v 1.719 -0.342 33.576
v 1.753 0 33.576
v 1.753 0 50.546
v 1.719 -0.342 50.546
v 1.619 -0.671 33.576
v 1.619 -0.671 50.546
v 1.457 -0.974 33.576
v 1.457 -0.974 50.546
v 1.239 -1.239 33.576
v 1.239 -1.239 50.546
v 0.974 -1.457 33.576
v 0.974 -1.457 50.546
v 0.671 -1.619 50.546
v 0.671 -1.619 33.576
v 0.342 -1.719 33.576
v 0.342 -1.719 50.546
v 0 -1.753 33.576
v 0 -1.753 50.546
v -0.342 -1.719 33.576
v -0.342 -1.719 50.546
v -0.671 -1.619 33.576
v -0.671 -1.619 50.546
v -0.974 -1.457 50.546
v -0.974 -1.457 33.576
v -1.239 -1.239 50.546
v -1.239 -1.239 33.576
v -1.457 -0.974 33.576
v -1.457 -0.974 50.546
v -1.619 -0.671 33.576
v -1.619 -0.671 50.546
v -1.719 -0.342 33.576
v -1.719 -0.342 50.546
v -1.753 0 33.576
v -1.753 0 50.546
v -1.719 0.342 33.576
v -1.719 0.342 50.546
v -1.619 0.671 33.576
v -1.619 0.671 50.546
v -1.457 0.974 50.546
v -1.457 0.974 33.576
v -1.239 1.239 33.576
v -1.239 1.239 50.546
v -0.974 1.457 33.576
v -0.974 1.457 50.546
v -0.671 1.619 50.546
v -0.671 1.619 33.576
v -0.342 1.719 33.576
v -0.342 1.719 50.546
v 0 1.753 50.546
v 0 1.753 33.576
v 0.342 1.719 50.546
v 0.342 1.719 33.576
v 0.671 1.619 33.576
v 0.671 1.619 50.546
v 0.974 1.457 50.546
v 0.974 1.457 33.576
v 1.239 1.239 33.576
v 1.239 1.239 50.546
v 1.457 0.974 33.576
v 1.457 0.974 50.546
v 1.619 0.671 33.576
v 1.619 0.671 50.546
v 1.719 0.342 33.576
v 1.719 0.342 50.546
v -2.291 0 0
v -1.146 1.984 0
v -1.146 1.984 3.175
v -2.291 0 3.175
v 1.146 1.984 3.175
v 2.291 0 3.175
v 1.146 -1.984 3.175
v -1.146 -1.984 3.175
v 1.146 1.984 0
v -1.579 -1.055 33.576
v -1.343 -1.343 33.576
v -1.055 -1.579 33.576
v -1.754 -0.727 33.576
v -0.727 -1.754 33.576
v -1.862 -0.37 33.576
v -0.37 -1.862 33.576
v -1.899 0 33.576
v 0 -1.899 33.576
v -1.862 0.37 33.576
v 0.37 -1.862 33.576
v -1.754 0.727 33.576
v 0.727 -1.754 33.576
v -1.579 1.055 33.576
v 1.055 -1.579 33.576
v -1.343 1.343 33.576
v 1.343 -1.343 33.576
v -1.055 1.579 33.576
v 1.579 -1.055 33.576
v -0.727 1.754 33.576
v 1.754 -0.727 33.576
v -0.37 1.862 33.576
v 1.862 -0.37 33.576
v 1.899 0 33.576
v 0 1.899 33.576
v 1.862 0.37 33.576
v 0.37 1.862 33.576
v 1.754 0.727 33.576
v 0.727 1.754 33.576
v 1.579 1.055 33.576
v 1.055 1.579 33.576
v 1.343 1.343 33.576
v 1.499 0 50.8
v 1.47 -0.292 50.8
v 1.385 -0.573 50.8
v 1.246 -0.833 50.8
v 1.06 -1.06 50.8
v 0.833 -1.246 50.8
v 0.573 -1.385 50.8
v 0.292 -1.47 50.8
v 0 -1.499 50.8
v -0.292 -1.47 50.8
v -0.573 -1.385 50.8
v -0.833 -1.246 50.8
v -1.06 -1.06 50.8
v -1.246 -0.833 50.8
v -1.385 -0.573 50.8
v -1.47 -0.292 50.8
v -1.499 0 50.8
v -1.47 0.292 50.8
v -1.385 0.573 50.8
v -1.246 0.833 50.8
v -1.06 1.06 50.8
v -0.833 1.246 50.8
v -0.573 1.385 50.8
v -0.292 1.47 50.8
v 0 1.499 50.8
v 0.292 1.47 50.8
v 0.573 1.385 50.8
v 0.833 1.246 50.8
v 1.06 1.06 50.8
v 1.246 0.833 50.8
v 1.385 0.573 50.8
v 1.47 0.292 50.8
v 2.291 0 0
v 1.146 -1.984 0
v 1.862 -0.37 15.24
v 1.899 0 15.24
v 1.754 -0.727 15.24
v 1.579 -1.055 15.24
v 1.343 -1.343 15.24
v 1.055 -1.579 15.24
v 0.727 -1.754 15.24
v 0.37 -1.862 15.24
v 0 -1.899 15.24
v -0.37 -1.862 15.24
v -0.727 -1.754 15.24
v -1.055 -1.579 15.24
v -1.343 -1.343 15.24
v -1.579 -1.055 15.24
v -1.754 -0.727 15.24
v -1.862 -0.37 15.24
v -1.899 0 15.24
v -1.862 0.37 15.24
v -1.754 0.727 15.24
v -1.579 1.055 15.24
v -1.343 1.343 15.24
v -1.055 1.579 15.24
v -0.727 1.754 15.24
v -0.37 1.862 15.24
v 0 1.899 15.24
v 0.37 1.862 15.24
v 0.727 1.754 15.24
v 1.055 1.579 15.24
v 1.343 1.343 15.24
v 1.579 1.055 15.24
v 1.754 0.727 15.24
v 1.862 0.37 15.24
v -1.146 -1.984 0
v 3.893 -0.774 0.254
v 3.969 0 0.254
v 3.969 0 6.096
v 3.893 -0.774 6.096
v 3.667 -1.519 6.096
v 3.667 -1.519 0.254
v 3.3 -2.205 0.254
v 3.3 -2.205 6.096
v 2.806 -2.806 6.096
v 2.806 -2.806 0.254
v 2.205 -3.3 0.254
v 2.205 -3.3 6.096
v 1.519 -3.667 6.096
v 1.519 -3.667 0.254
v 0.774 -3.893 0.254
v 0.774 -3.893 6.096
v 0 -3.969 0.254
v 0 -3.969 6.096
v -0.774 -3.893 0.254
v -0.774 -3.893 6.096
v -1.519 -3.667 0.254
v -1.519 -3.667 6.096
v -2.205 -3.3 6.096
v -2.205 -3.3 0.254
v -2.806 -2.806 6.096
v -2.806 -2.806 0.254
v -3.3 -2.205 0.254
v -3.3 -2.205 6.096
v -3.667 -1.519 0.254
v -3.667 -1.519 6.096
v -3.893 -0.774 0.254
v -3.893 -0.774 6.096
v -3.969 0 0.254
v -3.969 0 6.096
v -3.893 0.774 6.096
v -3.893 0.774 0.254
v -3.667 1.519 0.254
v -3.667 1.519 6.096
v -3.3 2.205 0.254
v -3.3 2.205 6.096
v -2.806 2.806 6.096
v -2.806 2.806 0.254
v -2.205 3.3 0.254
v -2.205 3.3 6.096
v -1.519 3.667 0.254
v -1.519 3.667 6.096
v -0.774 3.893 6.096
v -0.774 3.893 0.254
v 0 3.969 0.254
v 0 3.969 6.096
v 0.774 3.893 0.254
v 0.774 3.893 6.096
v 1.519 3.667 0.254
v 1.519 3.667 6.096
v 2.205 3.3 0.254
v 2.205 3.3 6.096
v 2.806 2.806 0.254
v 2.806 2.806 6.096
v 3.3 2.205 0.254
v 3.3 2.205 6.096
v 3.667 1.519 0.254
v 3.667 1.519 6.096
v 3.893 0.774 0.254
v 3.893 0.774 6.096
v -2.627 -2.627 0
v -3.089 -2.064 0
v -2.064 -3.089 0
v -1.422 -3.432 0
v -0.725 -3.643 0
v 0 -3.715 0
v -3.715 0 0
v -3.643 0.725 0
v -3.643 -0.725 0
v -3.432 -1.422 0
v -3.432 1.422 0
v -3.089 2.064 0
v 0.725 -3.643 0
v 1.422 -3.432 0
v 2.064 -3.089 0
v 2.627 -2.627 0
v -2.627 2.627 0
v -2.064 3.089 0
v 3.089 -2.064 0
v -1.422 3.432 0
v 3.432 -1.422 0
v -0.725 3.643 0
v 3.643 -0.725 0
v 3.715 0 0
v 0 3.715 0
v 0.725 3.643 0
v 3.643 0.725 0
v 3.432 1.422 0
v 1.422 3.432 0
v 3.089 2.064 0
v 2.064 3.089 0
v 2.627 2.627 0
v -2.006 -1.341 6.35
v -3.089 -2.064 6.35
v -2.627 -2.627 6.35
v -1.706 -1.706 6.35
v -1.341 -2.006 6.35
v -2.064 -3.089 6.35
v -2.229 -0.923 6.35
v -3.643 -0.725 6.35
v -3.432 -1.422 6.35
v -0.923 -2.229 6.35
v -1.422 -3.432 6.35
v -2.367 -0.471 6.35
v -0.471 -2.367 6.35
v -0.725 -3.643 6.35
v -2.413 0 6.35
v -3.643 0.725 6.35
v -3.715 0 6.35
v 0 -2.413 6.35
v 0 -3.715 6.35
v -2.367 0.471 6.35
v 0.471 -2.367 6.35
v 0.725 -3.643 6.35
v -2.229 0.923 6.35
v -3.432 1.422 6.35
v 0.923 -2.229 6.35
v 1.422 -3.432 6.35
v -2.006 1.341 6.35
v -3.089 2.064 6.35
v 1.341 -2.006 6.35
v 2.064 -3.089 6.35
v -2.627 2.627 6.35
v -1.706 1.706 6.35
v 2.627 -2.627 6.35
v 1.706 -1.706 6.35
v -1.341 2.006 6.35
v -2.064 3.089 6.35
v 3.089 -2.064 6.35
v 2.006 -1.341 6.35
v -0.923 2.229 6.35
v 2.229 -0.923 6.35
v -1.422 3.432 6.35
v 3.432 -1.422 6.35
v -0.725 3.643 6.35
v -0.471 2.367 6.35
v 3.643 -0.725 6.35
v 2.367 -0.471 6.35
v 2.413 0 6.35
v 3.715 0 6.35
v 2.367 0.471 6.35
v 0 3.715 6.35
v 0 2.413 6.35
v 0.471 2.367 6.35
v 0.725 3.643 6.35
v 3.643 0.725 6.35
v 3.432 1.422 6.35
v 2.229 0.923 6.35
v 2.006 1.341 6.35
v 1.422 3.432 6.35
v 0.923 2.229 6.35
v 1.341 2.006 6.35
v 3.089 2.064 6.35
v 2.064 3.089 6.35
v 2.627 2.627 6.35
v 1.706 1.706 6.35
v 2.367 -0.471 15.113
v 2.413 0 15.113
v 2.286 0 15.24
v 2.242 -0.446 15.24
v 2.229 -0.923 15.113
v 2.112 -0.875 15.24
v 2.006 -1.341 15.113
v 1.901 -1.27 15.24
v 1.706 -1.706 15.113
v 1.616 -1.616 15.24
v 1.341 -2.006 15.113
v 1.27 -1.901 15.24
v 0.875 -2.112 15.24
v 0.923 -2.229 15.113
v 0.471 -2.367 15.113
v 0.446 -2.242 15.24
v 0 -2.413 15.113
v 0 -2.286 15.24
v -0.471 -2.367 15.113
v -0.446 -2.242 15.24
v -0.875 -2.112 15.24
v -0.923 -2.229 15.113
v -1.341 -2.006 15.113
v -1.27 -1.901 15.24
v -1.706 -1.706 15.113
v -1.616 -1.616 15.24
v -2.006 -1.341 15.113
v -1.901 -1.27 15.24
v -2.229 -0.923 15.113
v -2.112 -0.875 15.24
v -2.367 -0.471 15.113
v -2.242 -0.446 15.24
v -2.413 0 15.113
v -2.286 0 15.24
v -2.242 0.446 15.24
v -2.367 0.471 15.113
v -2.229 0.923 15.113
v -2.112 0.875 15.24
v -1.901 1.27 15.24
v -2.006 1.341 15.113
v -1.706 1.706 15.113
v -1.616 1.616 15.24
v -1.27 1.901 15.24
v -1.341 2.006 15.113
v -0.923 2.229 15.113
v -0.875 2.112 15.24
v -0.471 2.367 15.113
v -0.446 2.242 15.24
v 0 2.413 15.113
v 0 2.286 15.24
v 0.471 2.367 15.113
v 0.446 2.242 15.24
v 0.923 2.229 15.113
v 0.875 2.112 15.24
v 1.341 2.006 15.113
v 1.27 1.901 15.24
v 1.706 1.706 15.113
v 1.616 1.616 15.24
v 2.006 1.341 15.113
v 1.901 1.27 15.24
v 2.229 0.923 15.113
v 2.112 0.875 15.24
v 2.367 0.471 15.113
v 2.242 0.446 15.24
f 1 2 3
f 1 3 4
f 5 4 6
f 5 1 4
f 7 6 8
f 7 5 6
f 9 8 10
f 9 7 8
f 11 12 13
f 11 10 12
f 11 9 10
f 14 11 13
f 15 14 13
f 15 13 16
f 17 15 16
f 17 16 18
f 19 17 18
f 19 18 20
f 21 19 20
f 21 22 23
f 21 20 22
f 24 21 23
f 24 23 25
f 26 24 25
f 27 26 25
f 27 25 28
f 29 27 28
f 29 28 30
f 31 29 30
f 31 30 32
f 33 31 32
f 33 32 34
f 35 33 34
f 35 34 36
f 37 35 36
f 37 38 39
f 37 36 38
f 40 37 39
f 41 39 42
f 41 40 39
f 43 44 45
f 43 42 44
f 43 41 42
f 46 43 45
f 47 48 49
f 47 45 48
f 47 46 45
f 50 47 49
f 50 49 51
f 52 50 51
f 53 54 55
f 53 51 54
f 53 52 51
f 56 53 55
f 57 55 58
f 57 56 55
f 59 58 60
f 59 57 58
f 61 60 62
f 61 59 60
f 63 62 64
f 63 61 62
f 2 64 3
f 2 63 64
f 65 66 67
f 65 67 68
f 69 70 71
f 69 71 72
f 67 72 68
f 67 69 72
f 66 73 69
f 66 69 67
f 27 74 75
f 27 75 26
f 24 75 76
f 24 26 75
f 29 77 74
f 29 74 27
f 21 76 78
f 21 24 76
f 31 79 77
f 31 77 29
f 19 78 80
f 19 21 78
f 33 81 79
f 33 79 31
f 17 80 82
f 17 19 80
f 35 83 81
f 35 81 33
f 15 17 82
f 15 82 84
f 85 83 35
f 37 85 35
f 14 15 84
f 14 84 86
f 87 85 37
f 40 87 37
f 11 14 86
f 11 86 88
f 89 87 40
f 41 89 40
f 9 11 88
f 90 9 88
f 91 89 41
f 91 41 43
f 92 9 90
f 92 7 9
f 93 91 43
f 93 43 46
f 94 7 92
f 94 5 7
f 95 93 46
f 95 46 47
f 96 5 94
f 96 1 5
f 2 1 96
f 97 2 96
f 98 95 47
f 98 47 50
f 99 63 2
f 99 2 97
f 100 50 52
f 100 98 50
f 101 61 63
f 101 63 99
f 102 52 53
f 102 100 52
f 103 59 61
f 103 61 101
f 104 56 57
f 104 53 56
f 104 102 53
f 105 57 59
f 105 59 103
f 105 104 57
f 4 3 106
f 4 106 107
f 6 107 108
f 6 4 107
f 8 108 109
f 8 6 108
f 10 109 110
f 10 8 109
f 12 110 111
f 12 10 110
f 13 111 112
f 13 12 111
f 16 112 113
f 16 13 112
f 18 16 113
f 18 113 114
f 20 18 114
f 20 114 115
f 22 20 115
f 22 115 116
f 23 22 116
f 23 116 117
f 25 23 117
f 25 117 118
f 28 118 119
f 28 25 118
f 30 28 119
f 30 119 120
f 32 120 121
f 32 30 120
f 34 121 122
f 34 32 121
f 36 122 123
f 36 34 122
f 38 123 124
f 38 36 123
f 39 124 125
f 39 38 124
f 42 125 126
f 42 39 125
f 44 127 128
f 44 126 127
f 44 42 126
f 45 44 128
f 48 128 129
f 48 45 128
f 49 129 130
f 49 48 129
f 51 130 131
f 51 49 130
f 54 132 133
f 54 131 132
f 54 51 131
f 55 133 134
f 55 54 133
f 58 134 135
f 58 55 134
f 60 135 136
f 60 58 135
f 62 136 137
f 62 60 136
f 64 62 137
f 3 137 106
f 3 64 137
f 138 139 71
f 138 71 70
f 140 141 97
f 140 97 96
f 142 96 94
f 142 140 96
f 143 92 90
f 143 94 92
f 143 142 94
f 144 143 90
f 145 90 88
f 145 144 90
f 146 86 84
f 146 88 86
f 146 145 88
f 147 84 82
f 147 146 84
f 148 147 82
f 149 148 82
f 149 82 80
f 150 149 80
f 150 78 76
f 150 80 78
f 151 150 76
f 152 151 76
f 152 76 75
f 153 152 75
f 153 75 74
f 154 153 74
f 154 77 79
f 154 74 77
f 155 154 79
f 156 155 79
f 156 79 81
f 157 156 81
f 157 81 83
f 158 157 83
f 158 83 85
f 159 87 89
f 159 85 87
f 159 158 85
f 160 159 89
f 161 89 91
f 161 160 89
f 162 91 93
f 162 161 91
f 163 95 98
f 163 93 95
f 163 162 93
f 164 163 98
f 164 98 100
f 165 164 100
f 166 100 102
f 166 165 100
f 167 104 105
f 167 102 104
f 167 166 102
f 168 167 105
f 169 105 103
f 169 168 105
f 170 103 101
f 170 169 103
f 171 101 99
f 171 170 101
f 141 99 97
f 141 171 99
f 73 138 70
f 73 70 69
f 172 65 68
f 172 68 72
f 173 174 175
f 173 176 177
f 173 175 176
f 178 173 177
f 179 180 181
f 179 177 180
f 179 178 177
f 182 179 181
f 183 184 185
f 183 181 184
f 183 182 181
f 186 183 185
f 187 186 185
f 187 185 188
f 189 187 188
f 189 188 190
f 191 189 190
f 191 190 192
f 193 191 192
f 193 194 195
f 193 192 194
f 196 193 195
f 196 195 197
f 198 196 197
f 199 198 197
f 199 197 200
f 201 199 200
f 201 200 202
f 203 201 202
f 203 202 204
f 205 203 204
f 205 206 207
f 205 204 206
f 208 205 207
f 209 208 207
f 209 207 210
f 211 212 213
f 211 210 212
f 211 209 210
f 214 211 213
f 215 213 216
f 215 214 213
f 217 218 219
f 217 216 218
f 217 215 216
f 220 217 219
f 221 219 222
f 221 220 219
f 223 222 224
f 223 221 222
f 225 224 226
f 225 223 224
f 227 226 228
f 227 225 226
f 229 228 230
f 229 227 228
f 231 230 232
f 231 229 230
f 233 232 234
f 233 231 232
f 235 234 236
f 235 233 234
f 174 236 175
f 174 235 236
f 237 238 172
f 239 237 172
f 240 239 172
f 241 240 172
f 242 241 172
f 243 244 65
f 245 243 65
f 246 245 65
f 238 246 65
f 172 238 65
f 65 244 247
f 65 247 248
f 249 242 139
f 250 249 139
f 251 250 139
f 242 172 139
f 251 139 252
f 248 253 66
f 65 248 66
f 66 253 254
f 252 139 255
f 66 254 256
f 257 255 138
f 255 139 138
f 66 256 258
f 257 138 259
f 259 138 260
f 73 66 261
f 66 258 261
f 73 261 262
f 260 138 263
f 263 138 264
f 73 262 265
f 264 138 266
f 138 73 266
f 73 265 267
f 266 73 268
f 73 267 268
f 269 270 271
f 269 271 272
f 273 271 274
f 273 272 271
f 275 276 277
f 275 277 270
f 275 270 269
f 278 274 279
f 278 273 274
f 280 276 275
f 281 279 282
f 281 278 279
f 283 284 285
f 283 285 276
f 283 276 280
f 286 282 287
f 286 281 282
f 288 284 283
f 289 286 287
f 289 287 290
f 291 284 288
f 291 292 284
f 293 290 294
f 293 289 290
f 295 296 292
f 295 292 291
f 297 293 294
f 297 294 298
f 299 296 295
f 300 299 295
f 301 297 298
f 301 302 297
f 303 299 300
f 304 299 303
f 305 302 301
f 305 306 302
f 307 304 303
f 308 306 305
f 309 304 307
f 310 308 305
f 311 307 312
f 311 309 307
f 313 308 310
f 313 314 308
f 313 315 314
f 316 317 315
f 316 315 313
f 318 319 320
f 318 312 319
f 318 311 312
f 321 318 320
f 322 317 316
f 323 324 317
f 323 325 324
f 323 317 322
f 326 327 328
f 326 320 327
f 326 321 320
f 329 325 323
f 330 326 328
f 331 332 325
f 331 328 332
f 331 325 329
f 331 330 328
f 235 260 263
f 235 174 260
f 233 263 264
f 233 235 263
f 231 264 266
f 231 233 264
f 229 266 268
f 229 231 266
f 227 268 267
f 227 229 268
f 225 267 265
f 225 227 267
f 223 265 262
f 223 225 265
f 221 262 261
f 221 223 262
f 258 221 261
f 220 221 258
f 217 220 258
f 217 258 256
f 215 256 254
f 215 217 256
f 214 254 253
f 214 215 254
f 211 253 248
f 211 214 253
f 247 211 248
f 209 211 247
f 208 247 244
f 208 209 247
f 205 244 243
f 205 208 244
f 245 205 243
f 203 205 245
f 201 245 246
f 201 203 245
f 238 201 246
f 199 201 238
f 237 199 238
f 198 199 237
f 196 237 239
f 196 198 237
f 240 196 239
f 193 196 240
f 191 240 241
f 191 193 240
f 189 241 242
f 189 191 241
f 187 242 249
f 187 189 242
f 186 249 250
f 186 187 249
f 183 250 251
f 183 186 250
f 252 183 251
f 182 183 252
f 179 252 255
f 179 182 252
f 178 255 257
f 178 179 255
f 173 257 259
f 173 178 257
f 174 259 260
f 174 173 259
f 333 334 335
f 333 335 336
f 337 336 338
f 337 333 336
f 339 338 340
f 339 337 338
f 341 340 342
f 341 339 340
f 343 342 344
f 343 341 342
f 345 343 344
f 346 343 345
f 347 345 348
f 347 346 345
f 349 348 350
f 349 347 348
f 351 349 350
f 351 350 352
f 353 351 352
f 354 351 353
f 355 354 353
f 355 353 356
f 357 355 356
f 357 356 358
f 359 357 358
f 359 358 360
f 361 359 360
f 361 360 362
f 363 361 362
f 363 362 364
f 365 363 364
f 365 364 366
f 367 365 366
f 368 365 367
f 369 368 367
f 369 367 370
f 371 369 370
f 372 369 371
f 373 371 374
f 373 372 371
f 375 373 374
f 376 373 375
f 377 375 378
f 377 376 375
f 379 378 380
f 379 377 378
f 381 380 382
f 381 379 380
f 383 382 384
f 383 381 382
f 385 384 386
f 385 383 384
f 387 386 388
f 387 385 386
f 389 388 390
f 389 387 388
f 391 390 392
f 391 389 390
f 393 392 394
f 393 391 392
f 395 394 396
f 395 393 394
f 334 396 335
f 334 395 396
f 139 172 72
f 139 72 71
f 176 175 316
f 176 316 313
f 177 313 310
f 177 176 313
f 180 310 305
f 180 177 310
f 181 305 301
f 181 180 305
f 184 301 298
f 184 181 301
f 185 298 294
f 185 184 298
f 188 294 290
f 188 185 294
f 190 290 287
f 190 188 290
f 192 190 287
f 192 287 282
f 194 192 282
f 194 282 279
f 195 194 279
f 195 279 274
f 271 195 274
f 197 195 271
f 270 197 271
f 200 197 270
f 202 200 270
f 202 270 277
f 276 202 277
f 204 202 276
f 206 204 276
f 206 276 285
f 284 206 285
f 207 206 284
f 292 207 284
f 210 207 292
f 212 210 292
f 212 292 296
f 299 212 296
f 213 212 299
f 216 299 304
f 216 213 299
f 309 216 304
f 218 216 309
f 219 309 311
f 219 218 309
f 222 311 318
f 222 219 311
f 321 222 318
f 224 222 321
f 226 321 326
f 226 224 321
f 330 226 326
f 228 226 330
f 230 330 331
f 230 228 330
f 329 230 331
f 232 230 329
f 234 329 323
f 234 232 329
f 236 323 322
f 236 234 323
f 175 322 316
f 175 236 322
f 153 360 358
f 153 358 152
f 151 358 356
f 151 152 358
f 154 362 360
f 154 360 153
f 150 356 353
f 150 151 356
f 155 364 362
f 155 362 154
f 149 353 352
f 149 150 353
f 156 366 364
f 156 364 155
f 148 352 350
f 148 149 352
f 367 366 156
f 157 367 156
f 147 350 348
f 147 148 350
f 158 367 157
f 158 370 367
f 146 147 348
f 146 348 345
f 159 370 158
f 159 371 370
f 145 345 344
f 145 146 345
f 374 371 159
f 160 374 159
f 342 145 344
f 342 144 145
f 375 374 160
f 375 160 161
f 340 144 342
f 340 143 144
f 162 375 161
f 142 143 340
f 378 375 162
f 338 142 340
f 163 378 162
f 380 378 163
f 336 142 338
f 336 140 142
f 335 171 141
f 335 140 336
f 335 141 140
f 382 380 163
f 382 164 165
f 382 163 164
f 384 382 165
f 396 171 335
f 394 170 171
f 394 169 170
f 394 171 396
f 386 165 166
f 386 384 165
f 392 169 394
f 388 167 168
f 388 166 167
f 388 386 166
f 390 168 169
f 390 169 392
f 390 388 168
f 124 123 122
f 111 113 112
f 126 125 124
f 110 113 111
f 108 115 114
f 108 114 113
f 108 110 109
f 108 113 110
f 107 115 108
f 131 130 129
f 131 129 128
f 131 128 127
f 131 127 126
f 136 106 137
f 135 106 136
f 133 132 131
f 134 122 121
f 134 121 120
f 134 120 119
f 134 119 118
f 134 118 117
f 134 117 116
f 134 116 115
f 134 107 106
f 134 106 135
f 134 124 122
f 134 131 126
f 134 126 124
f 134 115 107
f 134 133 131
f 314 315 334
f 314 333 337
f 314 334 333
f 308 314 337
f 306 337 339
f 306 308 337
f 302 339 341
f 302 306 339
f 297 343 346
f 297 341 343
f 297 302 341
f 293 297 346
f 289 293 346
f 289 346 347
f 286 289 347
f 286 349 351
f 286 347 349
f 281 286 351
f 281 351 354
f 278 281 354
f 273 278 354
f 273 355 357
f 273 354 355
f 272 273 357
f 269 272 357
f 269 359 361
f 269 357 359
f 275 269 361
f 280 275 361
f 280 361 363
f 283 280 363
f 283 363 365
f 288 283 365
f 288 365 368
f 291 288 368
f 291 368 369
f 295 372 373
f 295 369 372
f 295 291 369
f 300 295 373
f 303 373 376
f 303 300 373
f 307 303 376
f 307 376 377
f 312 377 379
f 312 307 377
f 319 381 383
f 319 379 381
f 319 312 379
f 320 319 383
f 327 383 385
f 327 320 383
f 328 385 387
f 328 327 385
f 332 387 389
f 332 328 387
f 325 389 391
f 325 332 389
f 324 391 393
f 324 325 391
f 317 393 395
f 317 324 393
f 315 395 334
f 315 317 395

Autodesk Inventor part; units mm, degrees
ref_plane "YZ Plane" through (0, 0, 0) normal (1, 0, 0) x (0, 1, 0)
ref_plane "XZ Plane" through (0, 0, 0) normal (0, 1, 0) x (-1, 0, 0)
ref_plane "XY Plane" through (0, 0, 0) normal (0, 0, 1) x (1, 0, 0)
sketch "Sketch1" plane through (0, 0, 0) normal (0, 0, 1) x (1, 0, 0)
  circle A0 centre (0, 0) radius 3.9688
  dimension "d0" = 7.9375
extrude "Extrusion1" add sketch "Sketch1" along normal blind 6.35
sketch "Sketch2" plane through (0, 0, 6.35) normal (0, 0, 1) x (1, 0, 0)
  circle A0 centre (0, 0) radius 3.9688 projected
  circle A1 centre (0, 0) radius 2.413
  dimension "d4" = 4.826
extrude "Extrusion2" add sketch "Sketch2" along normal blind 8.89 contours A1
thread "Thread1" size "10-32 UNF" class "2A" standard "ANSI Unified Screw Threads" full length
sketch "Sketch3" plane through (0, 0, 15.24) normal (0, 0, 1) x (1, 0, 0)
  circle A0 centre (0, 0) radius 2.413 projected
  circle A1 centre (0, 0) radius 1.8986
  dimension "d17" = 3.7973
extrude "Extrusion3" add sketch "Sketch3" along normal blind 18.3356 contours A1
sketch "Sketch4" plane through (0, 0, 0) normal (0, 0, -1) x (-1, 0, 0)
  circle A0 centre (0, 0) radius 3.9688 projected
  line L0 (-2.2914, 0) -> (-1.1457, 1.9844)
  line L1 (-1.1457, 1.9844) -> (1.1457, 1.9844)
  line L2 (1.1457, 1.9844) -> (2.2914, 0)
  line L3 (2.2914, 0) -> (1.1457, -1.9844)
  line L4 (1.1457, -1.9844) -> (-1.1457, -1.9844)
  line L5 (-1.1457, -1.9844) -> (-2.2914, 0)
  dimension "d23" = 3.9688
extrude "Extrusion4" cut sketch "Sketch4" against normal blind 3.175 contours L0 L1 L2 L3 L4 L5
sketch "Sketch5" plane through (0, 0, 33.5756) normal (0, 0, 1) x (1, 0, 0)
  circle A0 centre (0, 0) radius 1.8986 projected
  circle A1 centre (0, 0) radius 1.7526
  dimension "d32" = 3.5052
extrude "Extrusion5" add sketch "Sketch5" along normal blind 17.2244 contours A1
thread "Thread2" size "6-32 UNC" class "2A" standard "ANSI Unified Screw Threads" full length
chamfer "Chamfer1" distance 0.254 angle 45 3 edges at (-3.9688, 0, 0) (-3.9688, 0, 6.35) (-1.7526, 0, 50.8)
chamfer "Chamfer2" distance 0.127 angle 45 1 edges at (-2.413, 0, 15.24)
properties part number "Rod Nut Side"
